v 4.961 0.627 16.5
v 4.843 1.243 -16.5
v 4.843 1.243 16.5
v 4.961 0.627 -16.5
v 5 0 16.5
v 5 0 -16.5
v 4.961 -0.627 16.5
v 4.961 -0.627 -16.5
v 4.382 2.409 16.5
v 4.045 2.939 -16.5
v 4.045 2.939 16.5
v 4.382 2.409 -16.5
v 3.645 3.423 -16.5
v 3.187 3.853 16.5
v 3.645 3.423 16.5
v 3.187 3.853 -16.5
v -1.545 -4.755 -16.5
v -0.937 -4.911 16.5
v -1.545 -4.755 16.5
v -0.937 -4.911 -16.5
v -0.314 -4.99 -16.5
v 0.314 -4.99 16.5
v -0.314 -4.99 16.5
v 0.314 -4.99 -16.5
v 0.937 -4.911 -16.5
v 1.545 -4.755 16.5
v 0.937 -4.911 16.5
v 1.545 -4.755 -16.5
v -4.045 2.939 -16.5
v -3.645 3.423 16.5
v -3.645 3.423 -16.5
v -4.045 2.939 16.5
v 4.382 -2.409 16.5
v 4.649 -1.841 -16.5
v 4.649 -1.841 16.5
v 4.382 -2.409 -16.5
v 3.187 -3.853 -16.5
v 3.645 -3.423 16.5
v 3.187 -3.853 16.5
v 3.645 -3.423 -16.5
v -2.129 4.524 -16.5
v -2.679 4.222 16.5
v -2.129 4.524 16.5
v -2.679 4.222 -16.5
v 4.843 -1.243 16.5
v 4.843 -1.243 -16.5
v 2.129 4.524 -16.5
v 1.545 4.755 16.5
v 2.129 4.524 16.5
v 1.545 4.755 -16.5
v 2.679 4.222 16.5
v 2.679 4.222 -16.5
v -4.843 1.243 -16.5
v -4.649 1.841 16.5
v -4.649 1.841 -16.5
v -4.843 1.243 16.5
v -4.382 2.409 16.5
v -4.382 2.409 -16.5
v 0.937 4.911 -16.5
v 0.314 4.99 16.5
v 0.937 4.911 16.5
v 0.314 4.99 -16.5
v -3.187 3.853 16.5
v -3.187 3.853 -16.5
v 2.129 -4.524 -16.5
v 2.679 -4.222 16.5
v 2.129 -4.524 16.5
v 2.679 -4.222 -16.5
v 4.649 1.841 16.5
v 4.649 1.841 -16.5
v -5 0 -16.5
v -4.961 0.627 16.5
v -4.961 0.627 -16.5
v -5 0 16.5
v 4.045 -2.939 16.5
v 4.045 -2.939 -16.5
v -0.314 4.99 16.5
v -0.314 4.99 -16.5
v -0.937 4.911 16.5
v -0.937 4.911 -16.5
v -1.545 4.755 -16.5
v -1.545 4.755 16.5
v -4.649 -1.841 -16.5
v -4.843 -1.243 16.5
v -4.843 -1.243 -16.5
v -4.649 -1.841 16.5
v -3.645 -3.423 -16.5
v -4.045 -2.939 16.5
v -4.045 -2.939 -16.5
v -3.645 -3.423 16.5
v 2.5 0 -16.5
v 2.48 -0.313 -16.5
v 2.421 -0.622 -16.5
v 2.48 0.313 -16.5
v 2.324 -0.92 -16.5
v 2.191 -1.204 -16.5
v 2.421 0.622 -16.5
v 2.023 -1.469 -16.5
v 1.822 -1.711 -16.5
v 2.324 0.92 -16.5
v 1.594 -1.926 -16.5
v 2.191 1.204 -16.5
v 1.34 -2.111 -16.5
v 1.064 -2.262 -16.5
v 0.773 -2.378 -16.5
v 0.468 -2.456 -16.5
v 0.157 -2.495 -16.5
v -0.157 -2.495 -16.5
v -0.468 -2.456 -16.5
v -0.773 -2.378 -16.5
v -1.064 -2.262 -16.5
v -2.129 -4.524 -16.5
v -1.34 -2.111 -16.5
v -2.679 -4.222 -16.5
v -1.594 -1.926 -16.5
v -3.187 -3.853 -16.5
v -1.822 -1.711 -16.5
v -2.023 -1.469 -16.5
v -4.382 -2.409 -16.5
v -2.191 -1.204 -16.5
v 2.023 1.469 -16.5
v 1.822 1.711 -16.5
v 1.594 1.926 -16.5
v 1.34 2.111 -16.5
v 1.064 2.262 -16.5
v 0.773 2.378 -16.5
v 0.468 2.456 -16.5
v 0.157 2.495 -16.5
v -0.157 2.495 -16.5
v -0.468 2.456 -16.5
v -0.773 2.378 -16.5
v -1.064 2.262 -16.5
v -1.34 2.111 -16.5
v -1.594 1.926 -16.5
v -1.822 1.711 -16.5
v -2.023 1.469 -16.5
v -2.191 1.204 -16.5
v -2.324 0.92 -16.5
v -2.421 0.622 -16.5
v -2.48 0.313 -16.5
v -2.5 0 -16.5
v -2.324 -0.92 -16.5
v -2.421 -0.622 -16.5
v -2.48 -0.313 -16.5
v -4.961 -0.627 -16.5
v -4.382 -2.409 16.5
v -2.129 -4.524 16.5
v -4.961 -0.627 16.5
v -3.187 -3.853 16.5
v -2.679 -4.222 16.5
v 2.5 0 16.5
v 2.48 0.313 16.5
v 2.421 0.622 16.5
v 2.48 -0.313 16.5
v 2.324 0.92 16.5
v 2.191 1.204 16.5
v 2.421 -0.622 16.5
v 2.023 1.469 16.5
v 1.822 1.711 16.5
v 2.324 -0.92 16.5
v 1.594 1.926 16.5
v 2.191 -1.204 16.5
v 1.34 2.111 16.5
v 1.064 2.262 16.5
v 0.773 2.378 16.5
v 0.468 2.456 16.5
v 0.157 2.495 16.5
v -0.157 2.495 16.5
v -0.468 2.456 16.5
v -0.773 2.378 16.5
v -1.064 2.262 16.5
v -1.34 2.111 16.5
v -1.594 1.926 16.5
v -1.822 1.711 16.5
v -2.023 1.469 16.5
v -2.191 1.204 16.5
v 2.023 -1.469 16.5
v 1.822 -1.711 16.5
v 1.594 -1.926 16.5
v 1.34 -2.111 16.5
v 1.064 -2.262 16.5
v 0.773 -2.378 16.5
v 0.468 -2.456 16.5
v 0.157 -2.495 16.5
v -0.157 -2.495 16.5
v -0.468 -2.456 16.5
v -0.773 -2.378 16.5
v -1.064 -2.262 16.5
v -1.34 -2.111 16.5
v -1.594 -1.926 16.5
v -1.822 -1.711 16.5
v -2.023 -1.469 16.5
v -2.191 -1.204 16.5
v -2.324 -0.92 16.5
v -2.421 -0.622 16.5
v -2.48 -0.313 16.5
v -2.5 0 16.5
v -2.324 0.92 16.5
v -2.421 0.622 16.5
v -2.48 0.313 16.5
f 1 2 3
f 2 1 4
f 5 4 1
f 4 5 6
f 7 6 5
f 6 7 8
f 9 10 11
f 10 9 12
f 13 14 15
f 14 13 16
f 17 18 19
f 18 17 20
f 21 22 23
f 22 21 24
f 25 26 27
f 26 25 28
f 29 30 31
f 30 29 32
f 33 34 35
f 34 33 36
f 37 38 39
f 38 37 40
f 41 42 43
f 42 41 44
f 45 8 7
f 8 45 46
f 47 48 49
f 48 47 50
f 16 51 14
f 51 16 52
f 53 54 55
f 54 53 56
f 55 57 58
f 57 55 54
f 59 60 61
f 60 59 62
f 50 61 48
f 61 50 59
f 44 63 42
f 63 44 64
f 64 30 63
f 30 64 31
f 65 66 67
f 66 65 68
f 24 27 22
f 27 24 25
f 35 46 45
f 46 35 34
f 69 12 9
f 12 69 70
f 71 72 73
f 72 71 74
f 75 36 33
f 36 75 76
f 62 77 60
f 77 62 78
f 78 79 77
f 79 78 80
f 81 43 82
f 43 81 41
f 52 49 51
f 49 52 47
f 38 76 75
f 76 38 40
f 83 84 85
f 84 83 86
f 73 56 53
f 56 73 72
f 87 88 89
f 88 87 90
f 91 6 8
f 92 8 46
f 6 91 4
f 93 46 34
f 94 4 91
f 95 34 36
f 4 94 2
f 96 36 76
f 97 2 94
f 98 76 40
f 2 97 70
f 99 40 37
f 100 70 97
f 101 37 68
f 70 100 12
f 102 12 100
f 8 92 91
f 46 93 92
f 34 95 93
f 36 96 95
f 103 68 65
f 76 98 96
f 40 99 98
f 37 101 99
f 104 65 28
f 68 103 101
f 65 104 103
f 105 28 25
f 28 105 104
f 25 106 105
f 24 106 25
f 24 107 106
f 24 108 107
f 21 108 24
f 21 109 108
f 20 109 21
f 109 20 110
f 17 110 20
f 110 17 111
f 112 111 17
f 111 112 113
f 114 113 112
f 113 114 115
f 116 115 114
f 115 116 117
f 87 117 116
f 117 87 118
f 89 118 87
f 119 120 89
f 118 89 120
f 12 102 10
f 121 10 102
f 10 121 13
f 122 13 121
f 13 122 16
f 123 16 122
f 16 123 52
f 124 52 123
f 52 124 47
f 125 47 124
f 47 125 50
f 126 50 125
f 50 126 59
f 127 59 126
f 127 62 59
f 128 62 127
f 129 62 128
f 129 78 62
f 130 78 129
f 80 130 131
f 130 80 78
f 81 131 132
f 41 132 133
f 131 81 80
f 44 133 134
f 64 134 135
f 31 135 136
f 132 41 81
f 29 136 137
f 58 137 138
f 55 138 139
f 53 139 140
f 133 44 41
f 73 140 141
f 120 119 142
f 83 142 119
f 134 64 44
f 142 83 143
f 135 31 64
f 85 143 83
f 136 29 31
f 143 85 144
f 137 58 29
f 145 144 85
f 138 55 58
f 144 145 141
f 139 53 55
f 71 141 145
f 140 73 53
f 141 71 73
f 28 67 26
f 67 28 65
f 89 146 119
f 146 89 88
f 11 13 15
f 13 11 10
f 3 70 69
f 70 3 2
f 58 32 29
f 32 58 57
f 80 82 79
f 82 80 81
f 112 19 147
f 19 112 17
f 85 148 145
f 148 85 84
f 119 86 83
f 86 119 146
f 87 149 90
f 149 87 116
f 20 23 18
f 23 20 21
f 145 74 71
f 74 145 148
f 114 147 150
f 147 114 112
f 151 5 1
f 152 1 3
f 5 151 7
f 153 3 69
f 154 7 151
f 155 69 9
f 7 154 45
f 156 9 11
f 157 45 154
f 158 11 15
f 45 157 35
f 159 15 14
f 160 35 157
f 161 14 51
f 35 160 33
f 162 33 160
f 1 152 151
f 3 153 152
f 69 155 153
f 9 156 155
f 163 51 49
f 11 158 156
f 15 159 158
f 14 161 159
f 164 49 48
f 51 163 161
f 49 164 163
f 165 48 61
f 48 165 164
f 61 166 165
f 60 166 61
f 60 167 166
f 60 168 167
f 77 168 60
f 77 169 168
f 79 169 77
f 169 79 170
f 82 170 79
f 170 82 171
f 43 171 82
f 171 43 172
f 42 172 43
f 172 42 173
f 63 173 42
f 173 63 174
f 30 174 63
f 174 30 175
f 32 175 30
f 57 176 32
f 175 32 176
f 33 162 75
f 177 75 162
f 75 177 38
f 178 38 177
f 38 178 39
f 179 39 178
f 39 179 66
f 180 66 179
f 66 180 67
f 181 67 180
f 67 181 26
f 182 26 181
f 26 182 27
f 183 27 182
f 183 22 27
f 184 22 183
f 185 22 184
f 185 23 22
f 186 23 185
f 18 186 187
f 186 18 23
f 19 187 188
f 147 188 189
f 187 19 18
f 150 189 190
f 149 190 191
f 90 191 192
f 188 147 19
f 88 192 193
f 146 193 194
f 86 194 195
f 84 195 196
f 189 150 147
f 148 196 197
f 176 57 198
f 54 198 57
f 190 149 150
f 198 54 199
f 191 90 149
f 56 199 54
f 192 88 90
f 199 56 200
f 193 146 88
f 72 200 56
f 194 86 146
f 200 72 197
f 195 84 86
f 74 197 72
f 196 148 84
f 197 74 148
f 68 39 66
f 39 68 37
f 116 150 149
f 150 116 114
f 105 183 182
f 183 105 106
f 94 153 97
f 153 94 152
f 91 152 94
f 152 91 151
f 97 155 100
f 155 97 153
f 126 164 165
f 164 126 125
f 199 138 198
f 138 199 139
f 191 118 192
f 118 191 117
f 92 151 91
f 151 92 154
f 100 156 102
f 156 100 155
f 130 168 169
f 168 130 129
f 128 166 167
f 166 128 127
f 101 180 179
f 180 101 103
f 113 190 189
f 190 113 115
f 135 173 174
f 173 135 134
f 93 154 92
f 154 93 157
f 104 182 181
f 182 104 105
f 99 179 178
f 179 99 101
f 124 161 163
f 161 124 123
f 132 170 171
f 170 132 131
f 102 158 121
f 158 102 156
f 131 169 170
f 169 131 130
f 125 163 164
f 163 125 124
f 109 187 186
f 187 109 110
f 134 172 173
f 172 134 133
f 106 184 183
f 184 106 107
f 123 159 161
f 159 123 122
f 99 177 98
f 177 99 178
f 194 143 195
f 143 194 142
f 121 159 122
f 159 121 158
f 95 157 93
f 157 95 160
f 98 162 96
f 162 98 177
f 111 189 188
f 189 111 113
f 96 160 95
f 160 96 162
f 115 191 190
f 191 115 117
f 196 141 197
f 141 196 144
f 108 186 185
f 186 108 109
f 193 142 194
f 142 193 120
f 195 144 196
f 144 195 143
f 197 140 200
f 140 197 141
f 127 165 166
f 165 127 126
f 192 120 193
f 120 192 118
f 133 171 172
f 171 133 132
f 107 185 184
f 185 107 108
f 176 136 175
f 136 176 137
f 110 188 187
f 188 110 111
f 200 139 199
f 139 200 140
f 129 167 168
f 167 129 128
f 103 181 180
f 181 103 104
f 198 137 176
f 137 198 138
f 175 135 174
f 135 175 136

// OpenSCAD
$fn = 50;


difference() {
	union() {
		translate(v = [0, 0, -16.5000000000]) {
			cylinder(h = 33, r = 5.0000000000);
		}
	}
	union() {
		translate(v = [0, 0, -100.0000000000]) {
			cylinder(h = 200, r = 2.5000000000);
		}
	}
}
